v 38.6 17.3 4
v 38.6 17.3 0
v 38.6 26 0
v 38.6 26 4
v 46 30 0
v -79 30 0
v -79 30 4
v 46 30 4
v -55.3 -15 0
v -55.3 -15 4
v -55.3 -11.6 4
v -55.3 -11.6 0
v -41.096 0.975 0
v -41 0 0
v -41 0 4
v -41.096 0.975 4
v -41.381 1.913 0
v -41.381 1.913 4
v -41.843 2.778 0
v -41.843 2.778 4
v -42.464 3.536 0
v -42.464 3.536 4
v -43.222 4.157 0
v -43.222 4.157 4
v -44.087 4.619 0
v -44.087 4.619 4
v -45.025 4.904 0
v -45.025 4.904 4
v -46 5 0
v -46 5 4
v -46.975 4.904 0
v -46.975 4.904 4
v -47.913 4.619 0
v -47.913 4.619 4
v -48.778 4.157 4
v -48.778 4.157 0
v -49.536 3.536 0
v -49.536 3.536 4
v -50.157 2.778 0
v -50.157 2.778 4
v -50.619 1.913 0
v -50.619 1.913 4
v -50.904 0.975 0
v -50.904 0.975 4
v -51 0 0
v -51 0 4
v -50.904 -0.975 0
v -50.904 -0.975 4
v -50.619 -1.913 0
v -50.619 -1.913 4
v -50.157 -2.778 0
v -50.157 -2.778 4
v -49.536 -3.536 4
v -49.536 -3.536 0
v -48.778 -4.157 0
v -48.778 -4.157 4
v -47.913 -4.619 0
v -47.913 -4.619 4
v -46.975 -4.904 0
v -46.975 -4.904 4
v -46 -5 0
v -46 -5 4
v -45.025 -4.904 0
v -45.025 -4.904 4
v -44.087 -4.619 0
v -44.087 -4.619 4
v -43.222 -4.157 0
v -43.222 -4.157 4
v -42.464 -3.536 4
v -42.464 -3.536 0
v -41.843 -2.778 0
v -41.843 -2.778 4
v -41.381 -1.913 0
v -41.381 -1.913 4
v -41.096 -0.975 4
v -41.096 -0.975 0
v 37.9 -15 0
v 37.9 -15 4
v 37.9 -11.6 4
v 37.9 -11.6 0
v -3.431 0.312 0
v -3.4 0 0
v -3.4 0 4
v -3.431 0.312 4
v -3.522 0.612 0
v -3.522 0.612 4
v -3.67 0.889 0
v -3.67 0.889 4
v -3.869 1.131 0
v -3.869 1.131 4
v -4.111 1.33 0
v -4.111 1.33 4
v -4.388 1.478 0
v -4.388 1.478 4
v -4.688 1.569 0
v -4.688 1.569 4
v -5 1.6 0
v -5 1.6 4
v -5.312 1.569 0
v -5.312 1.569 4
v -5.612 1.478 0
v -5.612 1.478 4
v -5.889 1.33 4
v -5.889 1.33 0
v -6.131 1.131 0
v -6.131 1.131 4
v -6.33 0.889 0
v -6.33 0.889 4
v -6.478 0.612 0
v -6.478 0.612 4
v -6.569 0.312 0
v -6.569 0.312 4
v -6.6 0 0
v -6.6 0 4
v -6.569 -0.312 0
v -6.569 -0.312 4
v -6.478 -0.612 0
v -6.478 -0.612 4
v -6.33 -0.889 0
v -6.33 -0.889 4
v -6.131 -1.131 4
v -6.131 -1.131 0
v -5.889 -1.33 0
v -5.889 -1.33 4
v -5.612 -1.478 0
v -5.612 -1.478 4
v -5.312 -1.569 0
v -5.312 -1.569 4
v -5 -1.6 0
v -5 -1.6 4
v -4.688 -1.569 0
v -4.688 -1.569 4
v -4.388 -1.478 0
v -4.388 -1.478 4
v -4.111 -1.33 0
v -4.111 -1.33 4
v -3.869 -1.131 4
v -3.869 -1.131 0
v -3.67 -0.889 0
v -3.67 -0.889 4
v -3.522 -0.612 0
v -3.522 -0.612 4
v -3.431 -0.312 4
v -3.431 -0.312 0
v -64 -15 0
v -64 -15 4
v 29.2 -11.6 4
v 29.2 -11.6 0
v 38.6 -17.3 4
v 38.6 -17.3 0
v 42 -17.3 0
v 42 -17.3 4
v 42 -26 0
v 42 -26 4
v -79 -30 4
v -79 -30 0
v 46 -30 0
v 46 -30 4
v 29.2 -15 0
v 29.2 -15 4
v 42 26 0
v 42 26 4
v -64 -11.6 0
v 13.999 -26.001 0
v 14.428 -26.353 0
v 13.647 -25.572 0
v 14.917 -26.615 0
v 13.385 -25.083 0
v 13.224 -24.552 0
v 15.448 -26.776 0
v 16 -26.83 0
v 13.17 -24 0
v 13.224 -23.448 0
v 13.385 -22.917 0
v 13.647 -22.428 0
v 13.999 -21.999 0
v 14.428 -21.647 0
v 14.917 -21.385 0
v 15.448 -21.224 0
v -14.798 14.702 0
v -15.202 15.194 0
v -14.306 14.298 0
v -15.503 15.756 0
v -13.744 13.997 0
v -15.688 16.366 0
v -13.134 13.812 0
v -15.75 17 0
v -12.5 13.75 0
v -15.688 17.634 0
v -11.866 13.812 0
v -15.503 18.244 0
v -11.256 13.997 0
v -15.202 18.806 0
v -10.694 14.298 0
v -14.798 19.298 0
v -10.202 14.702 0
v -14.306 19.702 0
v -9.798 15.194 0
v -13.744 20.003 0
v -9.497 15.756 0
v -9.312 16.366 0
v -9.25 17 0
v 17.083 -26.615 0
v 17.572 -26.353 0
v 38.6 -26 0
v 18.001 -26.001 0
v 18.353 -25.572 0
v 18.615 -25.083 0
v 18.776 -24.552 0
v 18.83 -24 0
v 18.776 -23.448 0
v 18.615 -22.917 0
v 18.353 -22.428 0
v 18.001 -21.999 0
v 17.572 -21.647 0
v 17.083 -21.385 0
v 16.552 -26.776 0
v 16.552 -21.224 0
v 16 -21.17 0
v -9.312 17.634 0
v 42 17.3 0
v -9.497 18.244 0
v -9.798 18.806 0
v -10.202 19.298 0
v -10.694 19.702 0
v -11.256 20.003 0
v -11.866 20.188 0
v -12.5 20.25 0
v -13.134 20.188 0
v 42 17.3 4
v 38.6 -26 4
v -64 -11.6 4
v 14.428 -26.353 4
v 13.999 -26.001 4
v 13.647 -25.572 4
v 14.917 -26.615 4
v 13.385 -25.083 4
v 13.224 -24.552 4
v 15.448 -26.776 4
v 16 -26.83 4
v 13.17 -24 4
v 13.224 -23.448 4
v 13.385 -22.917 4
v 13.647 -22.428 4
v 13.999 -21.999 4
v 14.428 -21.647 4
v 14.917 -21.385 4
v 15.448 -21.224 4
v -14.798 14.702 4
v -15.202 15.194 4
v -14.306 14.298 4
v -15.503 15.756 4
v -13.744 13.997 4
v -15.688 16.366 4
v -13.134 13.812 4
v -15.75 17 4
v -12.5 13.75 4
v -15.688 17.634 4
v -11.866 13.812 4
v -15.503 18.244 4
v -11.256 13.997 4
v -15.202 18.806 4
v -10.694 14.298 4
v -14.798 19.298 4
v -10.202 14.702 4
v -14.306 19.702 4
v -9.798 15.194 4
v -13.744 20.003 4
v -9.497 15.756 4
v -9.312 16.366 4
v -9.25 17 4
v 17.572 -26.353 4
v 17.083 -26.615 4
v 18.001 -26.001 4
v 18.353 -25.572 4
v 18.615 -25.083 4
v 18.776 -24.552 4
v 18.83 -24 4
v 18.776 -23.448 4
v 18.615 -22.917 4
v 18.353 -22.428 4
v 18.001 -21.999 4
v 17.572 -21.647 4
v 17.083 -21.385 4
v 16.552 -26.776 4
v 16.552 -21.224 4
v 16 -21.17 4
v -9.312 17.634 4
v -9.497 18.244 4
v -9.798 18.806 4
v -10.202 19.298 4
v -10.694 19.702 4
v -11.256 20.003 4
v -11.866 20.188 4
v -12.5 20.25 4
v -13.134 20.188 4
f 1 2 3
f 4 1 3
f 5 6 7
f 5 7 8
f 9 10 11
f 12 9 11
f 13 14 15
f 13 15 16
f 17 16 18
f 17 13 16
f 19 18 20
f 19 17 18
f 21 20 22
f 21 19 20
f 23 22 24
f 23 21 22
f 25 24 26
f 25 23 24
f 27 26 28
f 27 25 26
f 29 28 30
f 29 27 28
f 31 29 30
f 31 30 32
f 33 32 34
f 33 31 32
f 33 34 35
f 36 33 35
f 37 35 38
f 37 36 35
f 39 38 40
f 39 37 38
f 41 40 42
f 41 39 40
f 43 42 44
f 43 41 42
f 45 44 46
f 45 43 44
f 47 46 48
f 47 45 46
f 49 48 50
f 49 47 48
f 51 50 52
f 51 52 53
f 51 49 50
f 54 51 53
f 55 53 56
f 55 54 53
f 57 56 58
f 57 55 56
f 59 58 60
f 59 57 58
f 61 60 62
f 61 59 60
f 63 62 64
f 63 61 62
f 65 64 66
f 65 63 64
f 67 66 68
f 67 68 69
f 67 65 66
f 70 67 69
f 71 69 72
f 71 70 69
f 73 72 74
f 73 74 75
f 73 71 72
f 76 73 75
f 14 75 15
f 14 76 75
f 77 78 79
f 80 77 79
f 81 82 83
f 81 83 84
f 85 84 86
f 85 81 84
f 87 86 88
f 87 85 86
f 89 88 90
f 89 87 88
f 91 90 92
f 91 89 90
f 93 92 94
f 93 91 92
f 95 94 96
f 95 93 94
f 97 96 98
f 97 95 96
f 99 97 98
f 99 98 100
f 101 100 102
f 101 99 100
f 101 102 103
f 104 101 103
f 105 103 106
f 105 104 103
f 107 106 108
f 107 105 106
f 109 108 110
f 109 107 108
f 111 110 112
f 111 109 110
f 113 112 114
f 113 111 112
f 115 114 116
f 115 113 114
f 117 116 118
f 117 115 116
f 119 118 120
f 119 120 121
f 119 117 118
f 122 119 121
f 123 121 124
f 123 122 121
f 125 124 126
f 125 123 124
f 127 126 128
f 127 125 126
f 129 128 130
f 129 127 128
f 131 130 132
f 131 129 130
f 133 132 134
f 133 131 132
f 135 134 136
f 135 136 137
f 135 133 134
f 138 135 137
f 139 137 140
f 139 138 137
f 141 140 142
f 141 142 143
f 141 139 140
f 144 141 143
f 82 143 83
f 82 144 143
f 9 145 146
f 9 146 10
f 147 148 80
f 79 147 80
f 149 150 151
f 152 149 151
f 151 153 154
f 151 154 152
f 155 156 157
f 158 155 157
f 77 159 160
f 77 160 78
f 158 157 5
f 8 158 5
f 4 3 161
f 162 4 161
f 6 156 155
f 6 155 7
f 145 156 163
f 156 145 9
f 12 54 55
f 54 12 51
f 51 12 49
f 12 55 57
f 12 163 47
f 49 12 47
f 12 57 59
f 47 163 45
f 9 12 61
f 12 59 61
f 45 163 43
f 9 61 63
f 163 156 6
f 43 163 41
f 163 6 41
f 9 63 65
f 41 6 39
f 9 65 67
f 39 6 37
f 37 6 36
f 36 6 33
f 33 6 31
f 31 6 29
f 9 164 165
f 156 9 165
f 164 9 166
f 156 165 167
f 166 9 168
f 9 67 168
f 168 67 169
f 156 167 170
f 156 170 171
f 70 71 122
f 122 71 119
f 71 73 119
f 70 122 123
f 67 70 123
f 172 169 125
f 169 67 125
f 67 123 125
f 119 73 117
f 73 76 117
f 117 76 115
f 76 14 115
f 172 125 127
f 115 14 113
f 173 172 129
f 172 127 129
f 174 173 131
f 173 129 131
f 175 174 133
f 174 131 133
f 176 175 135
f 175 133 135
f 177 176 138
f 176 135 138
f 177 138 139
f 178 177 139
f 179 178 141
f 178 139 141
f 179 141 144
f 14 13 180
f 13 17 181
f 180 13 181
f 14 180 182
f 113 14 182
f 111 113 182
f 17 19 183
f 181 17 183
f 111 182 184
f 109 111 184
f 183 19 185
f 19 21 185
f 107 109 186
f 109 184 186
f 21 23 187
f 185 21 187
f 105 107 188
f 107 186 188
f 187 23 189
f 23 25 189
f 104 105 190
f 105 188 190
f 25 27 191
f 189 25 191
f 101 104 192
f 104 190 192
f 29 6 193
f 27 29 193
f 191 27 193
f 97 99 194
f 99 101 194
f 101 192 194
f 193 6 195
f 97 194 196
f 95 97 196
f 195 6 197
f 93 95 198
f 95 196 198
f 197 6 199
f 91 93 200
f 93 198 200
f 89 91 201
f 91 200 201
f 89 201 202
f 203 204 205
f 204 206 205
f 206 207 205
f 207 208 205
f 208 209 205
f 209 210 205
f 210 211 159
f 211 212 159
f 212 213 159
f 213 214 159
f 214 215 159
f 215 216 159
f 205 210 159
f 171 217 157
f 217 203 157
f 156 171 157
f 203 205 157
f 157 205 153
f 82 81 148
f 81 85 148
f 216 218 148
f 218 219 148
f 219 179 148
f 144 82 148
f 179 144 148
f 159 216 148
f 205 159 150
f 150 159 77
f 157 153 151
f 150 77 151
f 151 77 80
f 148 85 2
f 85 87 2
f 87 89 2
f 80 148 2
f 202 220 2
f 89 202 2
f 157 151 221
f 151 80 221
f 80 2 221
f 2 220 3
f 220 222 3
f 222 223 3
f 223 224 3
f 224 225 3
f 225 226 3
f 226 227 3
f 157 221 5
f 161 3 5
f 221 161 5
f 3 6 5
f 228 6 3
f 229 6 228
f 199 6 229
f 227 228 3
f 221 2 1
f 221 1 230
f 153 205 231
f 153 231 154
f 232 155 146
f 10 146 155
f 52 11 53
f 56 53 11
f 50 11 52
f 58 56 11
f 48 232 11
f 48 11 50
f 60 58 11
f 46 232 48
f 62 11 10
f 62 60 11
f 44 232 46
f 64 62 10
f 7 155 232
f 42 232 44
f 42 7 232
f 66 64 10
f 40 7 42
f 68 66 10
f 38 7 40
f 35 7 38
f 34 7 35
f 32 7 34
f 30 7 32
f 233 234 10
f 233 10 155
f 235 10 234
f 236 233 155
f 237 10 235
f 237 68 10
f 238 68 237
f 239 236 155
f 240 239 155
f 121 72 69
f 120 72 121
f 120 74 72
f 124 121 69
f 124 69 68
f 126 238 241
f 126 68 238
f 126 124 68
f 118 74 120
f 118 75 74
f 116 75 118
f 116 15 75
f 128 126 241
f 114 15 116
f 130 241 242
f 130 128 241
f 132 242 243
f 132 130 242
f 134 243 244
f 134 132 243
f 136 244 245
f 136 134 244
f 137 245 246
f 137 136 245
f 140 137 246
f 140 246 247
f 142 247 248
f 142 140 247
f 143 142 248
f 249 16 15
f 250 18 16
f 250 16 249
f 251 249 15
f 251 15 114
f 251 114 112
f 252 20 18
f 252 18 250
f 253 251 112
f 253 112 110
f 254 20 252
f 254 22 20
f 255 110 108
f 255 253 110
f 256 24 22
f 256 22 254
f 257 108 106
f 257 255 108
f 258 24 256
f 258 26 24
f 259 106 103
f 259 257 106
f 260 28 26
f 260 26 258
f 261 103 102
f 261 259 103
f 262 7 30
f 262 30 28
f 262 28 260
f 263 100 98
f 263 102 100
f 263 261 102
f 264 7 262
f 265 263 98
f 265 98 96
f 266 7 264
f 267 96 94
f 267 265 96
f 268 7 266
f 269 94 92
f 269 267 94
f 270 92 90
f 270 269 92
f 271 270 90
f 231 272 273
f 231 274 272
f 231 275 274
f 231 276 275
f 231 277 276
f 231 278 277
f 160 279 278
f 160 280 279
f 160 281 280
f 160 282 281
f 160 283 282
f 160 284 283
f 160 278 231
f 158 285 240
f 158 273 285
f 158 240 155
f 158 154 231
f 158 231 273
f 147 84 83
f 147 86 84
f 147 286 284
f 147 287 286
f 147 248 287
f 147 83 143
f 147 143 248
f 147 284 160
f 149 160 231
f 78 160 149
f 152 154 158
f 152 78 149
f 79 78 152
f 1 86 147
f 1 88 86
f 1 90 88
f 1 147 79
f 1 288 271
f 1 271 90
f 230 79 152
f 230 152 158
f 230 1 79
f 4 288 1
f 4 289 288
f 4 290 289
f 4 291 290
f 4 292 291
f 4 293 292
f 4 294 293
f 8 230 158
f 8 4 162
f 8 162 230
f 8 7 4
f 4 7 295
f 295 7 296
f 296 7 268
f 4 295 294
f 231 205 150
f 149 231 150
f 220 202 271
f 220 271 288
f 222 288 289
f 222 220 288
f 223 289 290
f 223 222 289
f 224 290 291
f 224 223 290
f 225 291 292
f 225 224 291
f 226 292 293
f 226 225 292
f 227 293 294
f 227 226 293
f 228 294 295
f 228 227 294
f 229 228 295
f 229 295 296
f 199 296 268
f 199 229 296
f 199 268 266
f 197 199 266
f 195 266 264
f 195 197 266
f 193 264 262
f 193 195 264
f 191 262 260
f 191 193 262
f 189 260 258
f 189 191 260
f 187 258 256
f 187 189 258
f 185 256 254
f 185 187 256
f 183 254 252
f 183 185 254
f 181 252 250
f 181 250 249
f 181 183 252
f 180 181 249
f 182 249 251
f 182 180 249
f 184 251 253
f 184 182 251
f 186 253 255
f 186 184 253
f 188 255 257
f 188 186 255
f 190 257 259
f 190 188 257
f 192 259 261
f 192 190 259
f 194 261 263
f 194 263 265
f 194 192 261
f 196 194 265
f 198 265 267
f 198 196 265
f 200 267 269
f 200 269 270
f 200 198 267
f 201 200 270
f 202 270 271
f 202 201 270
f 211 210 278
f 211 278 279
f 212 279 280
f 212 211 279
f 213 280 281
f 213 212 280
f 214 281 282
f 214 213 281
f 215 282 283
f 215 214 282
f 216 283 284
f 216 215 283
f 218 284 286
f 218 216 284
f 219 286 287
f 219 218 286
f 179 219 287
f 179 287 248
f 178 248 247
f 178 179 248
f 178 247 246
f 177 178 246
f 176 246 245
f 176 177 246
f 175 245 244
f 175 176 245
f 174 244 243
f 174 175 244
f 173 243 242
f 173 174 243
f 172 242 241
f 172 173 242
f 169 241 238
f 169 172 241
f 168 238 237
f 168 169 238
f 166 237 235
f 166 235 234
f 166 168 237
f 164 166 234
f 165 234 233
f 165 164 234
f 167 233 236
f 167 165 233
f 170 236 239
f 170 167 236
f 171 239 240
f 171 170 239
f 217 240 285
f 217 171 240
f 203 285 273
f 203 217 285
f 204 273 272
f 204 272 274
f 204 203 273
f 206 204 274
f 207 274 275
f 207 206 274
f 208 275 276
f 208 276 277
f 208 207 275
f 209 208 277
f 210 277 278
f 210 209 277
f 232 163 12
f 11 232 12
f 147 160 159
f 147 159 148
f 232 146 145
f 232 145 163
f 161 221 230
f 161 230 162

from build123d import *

# Parameters (mm, degrees)
SKETCH1_W               = 121
SKETCH1_H               = 60
SKETCH1_R               = 5
SKETCH1_R_2             = 3.25
SKETCH1_R_3             = 2.83
SKETCH1_R_4             = 1.6
SKETCH1_W_2             = 8.7
SKETCH1_H_2             = 3.4
BOSS_EXTRUDE1_DEPTH     = 4
SKETCH2_W               = 4
SKETCH2_H               = 60
BOSS_EXTRUDE2_DEPTH     = 4
CUT_EXTRUDE2_DEPTH      = 85.599054368
CUT_EXTRUDE2_DEPTH_BACK = 85.599054368
SKETCH3_W               = 3.4
SKETCH3_H               = 8.7


with BuildPart() as part:
    # Sketch1 → Boss-Extrude1 (new body)
    with BuildSketch(Plane.XY):
        with Locations((-18.5, 0)):
            Rectangle(SKETCH1_W, SKETCH1_H)
        with Locations((-46, 0)):
            Circle(SKETCH1_R, mode=Mode.SUBTRACT)
        with Locations((-12.5, 17)):
            Circle(SKETCH1_R_2, mode=Mode.SUBTRACT)
        with Locations((16, -24)):
            Circle(SKETCH1_R_3, mode=Mode.SUBTRACT)
        with Locations((-5, 0)):
            Circle(SKETCH1_R_4, mode=Mode.SUBTRACT)
        with Locations((-59.65, -13.3)):
            Rectangle(SKETCH1_W_2, SKETCH1_H_2, mode=Mode.SUBTRACT)
        with Locations((33.55, -13.3)):
            Rectangle(SKETCH1_W_2, SKETCH1_H_2, mode=Mode.SUBTRACT)
    extrude(amount=BOSS_EXTRUDE1_DEPTH)

    # Sketch2 → Boss-Extrude2 (add)
    with BuildSketch(Plane.XY):
        with Locations((44, 0)):
            Rectangle(SKETCH2_W, SKETCH2_H)
    extrude(amount=BOSS_EXTRUDE2_DEPTH)

    # Sketch3 → Cut-Extrude2 (cut, two sides: drawn at the far end of the back side and taken through both)
    with BuildSketch(Plane.XY.offset(-CUT_EXTRUDE2_DEPTH_BACK)):
        with Locations((40.3, 21.65)):
            Rectangle(SKETCH3_W, SKETCH3_H)
        with Locations((40.3, -21.65)):
            Rectangle(SKETCH3_W, SKETCH3_H)
    extrude(amount=CUT_EXTRUDE2_DEPTH + CUT_EXTRUDE2_DEPTH_BACK, mode=Mode.SUBTRACT)


solid = part.part
